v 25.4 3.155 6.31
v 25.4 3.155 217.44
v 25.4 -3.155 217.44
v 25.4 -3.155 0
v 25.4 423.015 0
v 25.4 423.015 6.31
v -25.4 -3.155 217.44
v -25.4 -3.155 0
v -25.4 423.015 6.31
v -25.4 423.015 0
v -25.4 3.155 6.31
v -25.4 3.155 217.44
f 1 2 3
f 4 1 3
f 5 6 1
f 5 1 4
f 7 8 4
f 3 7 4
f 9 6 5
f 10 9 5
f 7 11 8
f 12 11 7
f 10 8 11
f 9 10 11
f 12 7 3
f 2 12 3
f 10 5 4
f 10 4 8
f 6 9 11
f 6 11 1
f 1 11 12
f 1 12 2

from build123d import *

# Parameters (mm, degrees)
CROQUIS1_W              = 50.8
CROQUIS1_H              = 6.31
SALIENTE_EXTRUIR1_DEPTH = 285.44
CROQUIS3_W              = 50.8
CROQUIS3_H              = 6.31
SALIENTE_EXTRUIR2_DEPTH = 544.51
CROQUIS4_W              = 50.8
CROQUIS4_H              = 6.31
CROQUIS5_W              = 50.8
CROQUIS5_H              = 68
CORTAR_EXTRUIR1_DEPTH   = 10
CROQUIS11_W             = 48.12
CROQUIS11_H             = 211.5
CORTAR_EXTRUIR2_DEPTH   = 50.8


with BuildPart() as part:
    # Croquis1 → Saliente-Extruir1 (new body)
    with BuildSketch(Plane.XY):
        Rectangle(CROQUIS1_W, CROQUIS1_H)
    extrude(amount=SALIENTE_EXTRUIR1_DEPTH)

    # Croquis3 → Saliente-Extruir2 (add)
    with BuildSketch(Plane.XZ.offset(3.155)):
        with Locations((0, 3.155)):
            Rectangle(CROQUIS3_W, CROQUIS3_H)
    extrude(amount=-SALIENTE_EXTRUIR2_DEPTH)

    # Barrer1: sweep along a curve in space
    with BuildLine() as barrer1_path:
        Line((0, 541.355, 3.155), (0, 551.355, 3.155))
        Line((0, 551.355, 3.155), (0, 551.355, 44.965))
        Line((0, 551.355, 44.965), (0, 634.515, 44.965))
    # Croquis4 → Barrer1 (sweep)
    with BuildSketch(Plane(origin=(0, 541.355, 0), x_dir=(1, 0, 0), z_dir=(0, 1, 0))):
        with Locations((0, -3.155)):
            Rectangle(CROQUIS4_W, CROQUIS4_H)
    sweep(path=barrer1_path.line, transition=Transition.RIGHT)

    # Croquis5 → Cortar-Extruir1 (cut)
    with BuildSketch(Plane.XZ.offset(3.155)):
        with Locations((0, 251.44)):
            Rectangle(CROQUIS5_W, CROQUIS5_H)
    extrude(amount=-CORTAR_EXTRUIR1_DEPTH, mode=Mode.SUBTRACT)

    # Croquis11 → Cortar-Extruir2 (cut)
    with BuildSketch(Plane(origin=(25.4, 0, 0), x_dir=(0, 0, -1), z_dir=(1, 0, 0))):
        with Locations((-24.06, 528.765)):
            Rectangle(CROQUIS11_W, CROQUIS11_H)
    extrude(amount=-CORTAR_EXTRUIR2_DEPTH, mode=Mode.SUBTRACT)


solid = part.part
